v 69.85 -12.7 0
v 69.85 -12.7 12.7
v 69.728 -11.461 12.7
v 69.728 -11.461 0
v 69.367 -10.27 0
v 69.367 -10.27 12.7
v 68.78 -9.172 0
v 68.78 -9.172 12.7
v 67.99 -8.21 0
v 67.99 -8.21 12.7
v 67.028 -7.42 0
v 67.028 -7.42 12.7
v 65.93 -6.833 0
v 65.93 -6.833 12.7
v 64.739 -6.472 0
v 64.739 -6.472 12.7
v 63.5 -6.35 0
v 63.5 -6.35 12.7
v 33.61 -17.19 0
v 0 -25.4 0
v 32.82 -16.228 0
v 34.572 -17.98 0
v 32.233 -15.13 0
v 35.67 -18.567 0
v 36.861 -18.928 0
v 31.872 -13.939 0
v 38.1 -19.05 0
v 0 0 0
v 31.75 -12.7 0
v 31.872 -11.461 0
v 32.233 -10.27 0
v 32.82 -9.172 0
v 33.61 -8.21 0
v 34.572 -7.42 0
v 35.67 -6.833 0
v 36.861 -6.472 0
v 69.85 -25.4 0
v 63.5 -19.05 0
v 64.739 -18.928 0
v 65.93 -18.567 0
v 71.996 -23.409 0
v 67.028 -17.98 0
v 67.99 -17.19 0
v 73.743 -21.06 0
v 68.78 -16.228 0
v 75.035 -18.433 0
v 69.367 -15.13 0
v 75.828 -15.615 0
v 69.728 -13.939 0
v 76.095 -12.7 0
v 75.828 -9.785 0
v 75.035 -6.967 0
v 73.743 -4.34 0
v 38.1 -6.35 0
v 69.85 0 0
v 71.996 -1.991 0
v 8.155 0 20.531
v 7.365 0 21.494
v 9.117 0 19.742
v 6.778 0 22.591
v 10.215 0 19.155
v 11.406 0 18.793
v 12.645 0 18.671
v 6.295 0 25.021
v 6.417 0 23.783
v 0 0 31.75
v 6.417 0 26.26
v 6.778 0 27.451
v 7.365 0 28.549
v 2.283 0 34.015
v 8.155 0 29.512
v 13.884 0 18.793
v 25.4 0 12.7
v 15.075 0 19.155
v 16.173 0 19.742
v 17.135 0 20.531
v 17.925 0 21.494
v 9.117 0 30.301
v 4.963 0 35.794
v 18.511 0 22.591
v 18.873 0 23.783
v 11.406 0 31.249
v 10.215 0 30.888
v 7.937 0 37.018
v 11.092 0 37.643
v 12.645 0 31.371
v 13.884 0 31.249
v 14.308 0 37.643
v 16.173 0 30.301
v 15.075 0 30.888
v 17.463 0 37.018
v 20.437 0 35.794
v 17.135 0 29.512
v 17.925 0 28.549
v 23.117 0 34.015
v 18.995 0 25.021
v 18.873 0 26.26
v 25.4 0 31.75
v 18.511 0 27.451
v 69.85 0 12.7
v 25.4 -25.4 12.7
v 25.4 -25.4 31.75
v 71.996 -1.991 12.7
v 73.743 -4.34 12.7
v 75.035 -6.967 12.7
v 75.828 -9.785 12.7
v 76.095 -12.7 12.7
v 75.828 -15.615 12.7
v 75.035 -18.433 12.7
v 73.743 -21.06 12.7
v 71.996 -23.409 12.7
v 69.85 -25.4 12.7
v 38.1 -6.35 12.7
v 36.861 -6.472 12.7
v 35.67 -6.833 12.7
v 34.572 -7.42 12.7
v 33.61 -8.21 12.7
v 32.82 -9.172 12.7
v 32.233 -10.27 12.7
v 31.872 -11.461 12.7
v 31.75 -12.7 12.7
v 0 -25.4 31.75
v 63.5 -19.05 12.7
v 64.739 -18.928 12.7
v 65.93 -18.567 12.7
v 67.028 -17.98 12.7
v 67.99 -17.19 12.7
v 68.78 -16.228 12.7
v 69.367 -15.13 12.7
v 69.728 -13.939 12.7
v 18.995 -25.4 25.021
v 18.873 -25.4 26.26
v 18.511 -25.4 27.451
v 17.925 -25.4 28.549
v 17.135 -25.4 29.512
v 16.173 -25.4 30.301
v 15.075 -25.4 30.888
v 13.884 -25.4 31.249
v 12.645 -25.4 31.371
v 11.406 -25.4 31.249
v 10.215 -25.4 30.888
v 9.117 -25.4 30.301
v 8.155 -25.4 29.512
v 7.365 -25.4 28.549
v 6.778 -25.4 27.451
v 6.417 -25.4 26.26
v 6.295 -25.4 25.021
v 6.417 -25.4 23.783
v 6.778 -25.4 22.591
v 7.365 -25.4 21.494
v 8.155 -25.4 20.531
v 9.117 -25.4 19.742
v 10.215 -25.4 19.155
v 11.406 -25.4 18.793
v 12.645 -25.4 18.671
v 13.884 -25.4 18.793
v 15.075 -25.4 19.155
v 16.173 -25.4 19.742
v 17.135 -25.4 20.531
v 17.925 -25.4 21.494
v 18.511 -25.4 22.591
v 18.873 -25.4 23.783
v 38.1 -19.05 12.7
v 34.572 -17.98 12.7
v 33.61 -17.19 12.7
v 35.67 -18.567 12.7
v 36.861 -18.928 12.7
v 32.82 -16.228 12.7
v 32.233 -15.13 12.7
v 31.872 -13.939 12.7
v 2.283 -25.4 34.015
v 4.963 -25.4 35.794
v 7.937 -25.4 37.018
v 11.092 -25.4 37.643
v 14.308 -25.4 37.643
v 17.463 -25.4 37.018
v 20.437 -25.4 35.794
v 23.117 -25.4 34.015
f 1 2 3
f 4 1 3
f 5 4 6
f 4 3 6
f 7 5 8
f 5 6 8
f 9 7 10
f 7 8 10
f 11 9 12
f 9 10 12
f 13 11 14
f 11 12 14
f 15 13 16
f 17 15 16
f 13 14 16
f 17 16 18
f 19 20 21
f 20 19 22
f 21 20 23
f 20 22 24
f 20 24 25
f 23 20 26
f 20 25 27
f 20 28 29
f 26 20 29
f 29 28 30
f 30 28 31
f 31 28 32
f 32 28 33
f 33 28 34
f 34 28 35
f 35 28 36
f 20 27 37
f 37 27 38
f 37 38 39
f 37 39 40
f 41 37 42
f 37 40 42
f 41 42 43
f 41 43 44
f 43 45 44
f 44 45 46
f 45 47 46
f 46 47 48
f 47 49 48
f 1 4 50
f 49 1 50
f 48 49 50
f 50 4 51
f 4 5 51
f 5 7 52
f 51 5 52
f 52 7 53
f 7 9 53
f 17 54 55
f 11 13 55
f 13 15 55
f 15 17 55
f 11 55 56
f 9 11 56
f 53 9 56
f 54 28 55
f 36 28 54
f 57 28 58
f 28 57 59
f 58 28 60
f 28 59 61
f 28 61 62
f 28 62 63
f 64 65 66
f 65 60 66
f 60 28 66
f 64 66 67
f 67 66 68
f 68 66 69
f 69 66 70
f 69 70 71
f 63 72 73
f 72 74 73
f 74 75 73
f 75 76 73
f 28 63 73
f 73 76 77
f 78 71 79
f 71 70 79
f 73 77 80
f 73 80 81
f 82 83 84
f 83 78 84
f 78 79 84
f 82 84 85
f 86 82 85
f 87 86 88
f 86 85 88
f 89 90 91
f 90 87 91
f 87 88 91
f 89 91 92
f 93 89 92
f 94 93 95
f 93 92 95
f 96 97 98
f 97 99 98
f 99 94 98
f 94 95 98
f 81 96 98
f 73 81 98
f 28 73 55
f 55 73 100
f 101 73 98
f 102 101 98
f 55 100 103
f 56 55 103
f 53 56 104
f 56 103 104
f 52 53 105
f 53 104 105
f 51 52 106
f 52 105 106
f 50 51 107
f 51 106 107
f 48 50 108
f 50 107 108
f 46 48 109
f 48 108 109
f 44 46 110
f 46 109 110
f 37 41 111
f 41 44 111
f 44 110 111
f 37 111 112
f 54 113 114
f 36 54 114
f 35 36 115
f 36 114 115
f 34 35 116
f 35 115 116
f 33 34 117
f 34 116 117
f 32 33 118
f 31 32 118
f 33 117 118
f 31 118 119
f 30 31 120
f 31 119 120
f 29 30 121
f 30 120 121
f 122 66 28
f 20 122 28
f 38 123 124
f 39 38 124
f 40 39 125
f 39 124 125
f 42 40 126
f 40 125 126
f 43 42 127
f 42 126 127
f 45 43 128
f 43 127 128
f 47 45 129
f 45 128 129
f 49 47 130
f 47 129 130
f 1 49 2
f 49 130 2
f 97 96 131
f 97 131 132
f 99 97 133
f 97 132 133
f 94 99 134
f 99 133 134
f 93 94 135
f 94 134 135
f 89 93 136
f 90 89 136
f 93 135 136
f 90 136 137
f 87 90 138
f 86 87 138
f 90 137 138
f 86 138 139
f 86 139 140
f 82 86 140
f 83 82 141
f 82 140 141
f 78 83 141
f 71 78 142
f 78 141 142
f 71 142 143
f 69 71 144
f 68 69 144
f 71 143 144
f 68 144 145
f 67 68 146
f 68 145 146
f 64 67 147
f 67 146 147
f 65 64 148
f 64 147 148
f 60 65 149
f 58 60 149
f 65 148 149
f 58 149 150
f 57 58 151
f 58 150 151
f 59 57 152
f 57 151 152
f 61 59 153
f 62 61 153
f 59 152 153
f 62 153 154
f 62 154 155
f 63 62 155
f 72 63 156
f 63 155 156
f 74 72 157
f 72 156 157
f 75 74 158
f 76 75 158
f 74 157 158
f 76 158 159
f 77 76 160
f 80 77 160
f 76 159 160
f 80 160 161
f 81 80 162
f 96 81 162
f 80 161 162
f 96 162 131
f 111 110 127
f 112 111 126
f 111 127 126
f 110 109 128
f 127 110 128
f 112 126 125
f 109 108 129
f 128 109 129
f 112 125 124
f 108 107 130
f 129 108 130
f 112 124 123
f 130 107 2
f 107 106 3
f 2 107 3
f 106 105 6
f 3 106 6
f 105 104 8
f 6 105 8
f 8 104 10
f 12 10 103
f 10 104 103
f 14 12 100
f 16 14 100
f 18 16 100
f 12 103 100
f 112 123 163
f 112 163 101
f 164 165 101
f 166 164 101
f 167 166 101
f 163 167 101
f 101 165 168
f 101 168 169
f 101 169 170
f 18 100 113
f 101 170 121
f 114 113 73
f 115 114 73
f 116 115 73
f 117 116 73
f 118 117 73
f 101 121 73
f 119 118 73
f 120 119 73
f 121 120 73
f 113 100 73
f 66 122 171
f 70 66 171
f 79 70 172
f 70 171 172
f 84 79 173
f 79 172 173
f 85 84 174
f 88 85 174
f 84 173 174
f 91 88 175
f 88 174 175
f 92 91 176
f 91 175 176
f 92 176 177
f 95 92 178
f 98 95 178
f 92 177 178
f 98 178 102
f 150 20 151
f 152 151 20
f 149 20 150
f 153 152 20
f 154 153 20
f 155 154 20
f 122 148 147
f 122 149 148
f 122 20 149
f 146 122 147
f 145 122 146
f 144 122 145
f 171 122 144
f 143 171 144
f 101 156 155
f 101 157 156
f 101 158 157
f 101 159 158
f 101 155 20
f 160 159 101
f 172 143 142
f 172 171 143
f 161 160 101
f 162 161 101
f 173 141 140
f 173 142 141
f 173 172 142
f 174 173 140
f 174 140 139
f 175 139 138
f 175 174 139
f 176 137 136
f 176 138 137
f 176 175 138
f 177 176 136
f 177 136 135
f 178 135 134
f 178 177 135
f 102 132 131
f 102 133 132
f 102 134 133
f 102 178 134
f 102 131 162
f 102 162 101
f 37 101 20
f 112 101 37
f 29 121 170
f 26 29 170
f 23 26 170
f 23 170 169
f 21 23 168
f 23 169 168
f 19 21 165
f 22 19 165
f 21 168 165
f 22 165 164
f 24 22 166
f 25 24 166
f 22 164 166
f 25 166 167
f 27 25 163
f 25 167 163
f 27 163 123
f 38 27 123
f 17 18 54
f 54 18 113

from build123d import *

# Parameters (mm, degrees)
F1_DEPTH = 25.4
F3_DEPTH = 25.4
F5_DEPTH = 25.4
F6_R     = 6.35
F7_DEPTH = 25.4
F9_DEPTH = 25.4


with BuildPart() as f1:
    # F0 (on Front) → F1 (new body)
    with BuildSketch(Plane.XZ):
        Polygon((0, 38.1), (0, 0), (76.2, 0), (76.2, 12.7), (25.4, 12.7), (25.4, 38.1), align=None)
    extrude(amount=F1_DEPTH)

    # F2 (on face) → F3 (cut)
    with BuildSketch(Plane.XZ.offset(25.4)):
        with BuildLine():
            Line((0, 38.1), (0, 31.75))
            ThreePointArc((0, 31.75), (12.7, 37.721269), (25.4, 31.75))
            Line((25.4, 31.75), (25.4, 38.1))
            Line((25.4, 38.1), (0, 38.1))
        make_face()
    extrude(amount=-F3_DEPTH, mode=Mode.SUBTRACT)

    # F4 (on face) → F5 (cut)
    with BuildSketch(Plane.XY.offset(12.7)):
        with BuildLine():
            Line((63.5, -6.35), (38.1, -6.35))
            ThreePointArc((38.1, -6.35), (33.609872, -8.209872), (31.75, -12.7))
            ThreePointArc((31.75, -12.7), (33.609872, -17.190128), (38.1, -19.05))
            Line((38.1, -19.05), (63.5, -19.05))
            ThreePointArc((63.5, -19.05), (67.990128, -17.190128), (69.85, -12.7))
            ThreePointArc((69.85, -12.7), (67.990128, -8.209872), (63.5, -6.35))
        make_face()
    extrude(amount=-F5_DEPTH, mode=Mode.SUBTRACT)

    # F6 (on face) → F7 (cut)
    with BuildSketch(Plane.XZ.offset(25.4)):
        with Locations((12.644723, 25.02139)):
            Circle(F6_R)
    extrude(amount=-F7_DEPTH, mode=Mode.SUBTRACT)

    # F8 (on face) → F9 (cut)
    with BuildSketch(Plane.XY.offset(12.7)):
        with BuildLine():
            Line((76.2, 0), (69.85, 0))
            ThreePointArc((69.85, 0), (76.095109, -12.7), (69.85, -25.4))
            Line((69.85, -25.4), (76.2, -25.4))
            Line((76.2, -25.4), (76.2, 0))
        make_face()
    extrude(amount=-F9_DEPTH, mode=Mode.SUBTRACT)


solid = f1.part
